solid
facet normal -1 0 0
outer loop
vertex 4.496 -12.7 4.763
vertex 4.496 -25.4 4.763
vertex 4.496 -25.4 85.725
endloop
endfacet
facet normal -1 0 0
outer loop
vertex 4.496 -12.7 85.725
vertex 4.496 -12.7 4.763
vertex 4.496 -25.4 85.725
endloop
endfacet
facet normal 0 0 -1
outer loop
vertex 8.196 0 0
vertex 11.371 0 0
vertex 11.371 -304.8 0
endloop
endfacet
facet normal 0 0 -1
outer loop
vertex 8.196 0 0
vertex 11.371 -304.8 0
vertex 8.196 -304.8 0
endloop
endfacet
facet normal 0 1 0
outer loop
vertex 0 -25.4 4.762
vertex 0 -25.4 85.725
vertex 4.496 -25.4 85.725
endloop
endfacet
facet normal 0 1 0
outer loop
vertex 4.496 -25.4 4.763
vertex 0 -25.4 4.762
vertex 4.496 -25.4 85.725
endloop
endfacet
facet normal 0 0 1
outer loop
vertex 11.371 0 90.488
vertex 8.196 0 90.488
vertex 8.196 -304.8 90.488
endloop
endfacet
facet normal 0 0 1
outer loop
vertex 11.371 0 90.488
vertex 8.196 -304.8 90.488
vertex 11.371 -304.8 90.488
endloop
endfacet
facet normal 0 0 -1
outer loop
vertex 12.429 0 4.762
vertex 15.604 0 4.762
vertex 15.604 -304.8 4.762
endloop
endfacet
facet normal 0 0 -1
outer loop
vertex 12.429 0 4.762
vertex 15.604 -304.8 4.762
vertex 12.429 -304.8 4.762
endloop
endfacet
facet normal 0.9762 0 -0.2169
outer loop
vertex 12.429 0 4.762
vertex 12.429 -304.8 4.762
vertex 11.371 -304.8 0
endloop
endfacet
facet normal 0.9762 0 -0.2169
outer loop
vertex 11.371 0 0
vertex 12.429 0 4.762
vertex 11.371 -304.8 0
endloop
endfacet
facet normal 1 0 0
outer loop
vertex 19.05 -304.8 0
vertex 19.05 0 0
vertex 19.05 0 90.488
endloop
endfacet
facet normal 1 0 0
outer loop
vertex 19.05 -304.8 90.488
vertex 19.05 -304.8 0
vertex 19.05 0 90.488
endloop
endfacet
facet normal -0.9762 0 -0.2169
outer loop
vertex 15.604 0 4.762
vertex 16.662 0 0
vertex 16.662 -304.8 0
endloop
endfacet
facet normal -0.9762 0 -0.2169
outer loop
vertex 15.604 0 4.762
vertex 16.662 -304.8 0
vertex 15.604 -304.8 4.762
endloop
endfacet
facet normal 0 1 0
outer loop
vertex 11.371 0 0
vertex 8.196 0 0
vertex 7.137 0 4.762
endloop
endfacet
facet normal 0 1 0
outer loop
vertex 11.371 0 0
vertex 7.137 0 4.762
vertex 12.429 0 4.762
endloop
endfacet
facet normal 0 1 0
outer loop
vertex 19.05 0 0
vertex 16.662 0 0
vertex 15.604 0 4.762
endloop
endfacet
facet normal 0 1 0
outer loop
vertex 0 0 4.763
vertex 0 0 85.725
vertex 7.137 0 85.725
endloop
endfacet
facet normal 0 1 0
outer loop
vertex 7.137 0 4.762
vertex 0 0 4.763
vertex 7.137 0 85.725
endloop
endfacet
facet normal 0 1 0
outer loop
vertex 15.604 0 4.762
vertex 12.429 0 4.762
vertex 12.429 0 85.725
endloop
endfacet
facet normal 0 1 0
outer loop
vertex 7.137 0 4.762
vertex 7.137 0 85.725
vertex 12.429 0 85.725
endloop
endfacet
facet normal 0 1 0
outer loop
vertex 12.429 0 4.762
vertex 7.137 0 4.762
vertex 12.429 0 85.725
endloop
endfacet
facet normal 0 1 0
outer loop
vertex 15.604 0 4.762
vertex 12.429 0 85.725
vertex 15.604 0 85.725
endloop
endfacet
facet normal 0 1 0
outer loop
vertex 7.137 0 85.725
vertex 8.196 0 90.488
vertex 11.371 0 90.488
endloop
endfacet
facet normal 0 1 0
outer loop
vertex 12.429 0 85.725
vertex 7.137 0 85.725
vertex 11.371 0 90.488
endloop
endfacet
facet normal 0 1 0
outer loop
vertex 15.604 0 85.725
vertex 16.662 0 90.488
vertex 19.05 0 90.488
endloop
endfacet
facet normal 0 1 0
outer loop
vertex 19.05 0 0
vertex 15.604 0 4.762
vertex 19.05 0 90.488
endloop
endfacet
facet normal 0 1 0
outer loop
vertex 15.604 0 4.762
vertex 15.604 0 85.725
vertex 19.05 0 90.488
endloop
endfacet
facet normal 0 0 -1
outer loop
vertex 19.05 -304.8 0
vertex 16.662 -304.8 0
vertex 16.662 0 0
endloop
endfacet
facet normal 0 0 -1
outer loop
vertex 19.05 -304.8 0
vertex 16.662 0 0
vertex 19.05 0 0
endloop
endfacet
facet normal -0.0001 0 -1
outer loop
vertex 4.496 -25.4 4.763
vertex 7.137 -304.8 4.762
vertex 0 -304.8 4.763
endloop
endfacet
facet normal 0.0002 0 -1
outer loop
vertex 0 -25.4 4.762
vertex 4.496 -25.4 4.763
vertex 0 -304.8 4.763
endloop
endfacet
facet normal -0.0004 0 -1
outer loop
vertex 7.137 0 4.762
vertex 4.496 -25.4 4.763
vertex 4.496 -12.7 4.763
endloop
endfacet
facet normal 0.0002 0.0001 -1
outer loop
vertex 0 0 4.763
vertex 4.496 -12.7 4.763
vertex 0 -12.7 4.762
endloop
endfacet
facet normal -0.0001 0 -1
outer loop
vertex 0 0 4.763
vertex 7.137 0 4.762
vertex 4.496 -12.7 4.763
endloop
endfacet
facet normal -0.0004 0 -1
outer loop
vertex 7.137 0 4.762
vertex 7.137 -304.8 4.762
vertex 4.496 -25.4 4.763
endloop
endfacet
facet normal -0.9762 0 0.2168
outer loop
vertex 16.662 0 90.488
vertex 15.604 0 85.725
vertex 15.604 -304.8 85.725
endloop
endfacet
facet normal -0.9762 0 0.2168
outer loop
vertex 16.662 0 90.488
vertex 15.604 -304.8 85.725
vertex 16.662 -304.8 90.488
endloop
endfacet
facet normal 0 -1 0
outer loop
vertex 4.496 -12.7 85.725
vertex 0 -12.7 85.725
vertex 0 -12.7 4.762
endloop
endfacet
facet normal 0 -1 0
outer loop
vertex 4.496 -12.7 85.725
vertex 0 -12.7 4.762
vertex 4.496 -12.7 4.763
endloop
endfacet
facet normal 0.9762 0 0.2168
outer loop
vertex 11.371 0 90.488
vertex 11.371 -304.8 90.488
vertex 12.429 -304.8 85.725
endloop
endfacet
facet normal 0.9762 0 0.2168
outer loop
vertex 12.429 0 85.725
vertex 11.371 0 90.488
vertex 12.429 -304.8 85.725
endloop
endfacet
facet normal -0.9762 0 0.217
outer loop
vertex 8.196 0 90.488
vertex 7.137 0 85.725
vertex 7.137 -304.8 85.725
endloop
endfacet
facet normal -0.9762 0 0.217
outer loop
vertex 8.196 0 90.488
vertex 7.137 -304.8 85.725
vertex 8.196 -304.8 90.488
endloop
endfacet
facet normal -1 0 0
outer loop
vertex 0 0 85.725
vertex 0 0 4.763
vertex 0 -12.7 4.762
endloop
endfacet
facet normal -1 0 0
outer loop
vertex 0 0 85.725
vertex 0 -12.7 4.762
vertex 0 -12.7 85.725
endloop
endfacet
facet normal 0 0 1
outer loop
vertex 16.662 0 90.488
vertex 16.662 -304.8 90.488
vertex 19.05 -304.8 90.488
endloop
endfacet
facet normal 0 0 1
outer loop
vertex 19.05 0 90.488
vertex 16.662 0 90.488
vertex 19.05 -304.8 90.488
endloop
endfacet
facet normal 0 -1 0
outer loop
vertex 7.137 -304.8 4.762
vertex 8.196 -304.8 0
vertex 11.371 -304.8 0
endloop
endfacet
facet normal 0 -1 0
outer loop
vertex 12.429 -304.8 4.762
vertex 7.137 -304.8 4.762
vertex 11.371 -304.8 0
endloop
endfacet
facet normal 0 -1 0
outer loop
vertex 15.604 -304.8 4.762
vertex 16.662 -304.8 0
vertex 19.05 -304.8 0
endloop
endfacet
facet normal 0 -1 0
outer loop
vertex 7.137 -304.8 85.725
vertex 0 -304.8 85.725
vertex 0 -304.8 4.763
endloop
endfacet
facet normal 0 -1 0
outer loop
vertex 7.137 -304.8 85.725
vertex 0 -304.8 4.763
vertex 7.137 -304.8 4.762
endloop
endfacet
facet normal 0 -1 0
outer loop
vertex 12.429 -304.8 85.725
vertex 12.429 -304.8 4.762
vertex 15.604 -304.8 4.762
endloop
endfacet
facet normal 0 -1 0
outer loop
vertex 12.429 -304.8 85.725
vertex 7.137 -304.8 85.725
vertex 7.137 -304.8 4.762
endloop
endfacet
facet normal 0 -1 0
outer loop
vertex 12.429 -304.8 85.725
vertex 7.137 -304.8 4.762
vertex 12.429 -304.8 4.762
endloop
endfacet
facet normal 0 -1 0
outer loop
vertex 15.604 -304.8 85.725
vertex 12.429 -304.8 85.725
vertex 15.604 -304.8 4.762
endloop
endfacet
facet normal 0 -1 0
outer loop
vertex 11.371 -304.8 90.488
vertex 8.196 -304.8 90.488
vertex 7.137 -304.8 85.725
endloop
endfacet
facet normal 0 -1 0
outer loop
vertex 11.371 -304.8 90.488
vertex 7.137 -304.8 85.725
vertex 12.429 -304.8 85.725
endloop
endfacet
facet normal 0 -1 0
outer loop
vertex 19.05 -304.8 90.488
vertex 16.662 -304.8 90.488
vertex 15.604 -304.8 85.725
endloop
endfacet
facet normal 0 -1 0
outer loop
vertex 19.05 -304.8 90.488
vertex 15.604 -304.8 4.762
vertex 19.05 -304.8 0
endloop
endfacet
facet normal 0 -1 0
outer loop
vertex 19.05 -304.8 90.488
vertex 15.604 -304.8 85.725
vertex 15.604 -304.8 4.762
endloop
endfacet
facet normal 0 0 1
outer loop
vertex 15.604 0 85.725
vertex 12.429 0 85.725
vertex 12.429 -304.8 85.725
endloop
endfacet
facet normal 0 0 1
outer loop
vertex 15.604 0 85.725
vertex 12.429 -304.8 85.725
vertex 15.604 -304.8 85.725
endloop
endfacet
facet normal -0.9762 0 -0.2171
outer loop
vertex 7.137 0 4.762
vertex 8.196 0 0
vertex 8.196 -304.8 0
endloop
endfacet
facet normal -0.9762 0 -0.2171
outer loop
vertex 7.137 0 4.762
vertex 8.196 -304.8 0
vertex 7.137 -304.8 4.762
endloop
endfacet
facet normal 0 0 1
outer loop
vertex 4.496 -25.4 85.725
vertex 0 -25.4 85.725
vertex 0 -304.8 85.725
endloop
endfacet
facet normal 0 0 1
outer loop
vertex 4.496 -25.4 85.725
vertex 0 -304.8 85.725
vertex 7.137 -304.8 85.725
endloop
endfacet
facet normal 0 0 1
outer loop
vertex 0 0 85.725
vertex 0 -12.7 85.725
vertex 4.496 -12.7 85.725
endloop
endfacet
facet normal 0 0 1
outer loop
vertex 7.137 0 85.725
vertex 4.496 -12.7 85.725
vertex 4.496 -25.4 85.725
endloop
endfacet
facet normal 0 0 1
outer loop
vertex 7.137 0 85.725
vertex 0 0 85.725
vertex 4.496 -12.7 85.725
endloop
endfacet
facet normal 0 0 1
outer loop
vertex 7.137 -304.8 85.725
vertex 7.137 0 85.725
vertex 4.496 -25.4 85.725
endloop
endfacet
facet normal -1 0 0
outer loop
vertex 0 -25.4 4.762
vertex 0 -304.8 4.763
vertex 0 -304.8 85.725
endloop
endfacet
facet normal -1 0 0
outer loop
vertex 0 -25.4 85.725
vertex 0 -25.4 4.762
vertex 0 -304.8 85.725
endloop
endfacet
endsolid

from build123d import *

# Parameters (mm, degrees)
F0_W     = 19.05
F0_H     = 90.4875
F1_DEPTH = 304.8
F3_W     = 12.7
F3_H     = 101.6
F4_DEPTH = 12.7
F6_DEPTH = 304.8
F8_DEPTH = 304.8


with BuildPart() as f1:
    # F0 (on Front) → F1 (new body)
    with BuildSketch(Plane.XZ):
        with Locations((9.525, 45.24375)):
            Rectangle(F0_W, F0_H)
    extrude(amount=F1_DEPTH)

    # F3 (on offset) → F4 (cut)
    with BuildSketch(Plane.XZ.offset(25.4)):
        with Locations((-1.8542, 50.8)):
            Rectangle(F3_W, F3_H)
    extrude(amount=-F4_DEPTH, mode=Mode.SUBTRACT)

    # F5 (on Front) → F6 (cut)
    with BuildSketch(Plane.XZ):
        Polygon((-2.3876, -5.089026), (26.1874, -5.089026), (26.1874, 0), (16.6624, 0), (15.604067, 4.7625), (12.429067, 4.7625), (11.370733, 0), (8.195733, 0), (7.1374, 4.7625), (-2.3876, 4.7625), align=None)
    extrude(amount=F6_DEPTH, mode=Mode.SUBTRACT)

    # F7 (on Front) → F8 (cut)
    with BuildSketch(Plane.XZ):
        Polygon((26.1874, 90.4875), (26.1874, 95.576526), (-2.3876, 95.576526), (-2.3876, 85.725), (7.1374, 85.725), (8.195733, 90.4875), (11.370733, 90.4875), (12.429067, 85.725), (15.604067, 85.725), (16.6624, 90.4875), align=None)
    extrude(amount=F8_DEPTH, mode=Mode.SUBTRACT)


solid = f1.part
